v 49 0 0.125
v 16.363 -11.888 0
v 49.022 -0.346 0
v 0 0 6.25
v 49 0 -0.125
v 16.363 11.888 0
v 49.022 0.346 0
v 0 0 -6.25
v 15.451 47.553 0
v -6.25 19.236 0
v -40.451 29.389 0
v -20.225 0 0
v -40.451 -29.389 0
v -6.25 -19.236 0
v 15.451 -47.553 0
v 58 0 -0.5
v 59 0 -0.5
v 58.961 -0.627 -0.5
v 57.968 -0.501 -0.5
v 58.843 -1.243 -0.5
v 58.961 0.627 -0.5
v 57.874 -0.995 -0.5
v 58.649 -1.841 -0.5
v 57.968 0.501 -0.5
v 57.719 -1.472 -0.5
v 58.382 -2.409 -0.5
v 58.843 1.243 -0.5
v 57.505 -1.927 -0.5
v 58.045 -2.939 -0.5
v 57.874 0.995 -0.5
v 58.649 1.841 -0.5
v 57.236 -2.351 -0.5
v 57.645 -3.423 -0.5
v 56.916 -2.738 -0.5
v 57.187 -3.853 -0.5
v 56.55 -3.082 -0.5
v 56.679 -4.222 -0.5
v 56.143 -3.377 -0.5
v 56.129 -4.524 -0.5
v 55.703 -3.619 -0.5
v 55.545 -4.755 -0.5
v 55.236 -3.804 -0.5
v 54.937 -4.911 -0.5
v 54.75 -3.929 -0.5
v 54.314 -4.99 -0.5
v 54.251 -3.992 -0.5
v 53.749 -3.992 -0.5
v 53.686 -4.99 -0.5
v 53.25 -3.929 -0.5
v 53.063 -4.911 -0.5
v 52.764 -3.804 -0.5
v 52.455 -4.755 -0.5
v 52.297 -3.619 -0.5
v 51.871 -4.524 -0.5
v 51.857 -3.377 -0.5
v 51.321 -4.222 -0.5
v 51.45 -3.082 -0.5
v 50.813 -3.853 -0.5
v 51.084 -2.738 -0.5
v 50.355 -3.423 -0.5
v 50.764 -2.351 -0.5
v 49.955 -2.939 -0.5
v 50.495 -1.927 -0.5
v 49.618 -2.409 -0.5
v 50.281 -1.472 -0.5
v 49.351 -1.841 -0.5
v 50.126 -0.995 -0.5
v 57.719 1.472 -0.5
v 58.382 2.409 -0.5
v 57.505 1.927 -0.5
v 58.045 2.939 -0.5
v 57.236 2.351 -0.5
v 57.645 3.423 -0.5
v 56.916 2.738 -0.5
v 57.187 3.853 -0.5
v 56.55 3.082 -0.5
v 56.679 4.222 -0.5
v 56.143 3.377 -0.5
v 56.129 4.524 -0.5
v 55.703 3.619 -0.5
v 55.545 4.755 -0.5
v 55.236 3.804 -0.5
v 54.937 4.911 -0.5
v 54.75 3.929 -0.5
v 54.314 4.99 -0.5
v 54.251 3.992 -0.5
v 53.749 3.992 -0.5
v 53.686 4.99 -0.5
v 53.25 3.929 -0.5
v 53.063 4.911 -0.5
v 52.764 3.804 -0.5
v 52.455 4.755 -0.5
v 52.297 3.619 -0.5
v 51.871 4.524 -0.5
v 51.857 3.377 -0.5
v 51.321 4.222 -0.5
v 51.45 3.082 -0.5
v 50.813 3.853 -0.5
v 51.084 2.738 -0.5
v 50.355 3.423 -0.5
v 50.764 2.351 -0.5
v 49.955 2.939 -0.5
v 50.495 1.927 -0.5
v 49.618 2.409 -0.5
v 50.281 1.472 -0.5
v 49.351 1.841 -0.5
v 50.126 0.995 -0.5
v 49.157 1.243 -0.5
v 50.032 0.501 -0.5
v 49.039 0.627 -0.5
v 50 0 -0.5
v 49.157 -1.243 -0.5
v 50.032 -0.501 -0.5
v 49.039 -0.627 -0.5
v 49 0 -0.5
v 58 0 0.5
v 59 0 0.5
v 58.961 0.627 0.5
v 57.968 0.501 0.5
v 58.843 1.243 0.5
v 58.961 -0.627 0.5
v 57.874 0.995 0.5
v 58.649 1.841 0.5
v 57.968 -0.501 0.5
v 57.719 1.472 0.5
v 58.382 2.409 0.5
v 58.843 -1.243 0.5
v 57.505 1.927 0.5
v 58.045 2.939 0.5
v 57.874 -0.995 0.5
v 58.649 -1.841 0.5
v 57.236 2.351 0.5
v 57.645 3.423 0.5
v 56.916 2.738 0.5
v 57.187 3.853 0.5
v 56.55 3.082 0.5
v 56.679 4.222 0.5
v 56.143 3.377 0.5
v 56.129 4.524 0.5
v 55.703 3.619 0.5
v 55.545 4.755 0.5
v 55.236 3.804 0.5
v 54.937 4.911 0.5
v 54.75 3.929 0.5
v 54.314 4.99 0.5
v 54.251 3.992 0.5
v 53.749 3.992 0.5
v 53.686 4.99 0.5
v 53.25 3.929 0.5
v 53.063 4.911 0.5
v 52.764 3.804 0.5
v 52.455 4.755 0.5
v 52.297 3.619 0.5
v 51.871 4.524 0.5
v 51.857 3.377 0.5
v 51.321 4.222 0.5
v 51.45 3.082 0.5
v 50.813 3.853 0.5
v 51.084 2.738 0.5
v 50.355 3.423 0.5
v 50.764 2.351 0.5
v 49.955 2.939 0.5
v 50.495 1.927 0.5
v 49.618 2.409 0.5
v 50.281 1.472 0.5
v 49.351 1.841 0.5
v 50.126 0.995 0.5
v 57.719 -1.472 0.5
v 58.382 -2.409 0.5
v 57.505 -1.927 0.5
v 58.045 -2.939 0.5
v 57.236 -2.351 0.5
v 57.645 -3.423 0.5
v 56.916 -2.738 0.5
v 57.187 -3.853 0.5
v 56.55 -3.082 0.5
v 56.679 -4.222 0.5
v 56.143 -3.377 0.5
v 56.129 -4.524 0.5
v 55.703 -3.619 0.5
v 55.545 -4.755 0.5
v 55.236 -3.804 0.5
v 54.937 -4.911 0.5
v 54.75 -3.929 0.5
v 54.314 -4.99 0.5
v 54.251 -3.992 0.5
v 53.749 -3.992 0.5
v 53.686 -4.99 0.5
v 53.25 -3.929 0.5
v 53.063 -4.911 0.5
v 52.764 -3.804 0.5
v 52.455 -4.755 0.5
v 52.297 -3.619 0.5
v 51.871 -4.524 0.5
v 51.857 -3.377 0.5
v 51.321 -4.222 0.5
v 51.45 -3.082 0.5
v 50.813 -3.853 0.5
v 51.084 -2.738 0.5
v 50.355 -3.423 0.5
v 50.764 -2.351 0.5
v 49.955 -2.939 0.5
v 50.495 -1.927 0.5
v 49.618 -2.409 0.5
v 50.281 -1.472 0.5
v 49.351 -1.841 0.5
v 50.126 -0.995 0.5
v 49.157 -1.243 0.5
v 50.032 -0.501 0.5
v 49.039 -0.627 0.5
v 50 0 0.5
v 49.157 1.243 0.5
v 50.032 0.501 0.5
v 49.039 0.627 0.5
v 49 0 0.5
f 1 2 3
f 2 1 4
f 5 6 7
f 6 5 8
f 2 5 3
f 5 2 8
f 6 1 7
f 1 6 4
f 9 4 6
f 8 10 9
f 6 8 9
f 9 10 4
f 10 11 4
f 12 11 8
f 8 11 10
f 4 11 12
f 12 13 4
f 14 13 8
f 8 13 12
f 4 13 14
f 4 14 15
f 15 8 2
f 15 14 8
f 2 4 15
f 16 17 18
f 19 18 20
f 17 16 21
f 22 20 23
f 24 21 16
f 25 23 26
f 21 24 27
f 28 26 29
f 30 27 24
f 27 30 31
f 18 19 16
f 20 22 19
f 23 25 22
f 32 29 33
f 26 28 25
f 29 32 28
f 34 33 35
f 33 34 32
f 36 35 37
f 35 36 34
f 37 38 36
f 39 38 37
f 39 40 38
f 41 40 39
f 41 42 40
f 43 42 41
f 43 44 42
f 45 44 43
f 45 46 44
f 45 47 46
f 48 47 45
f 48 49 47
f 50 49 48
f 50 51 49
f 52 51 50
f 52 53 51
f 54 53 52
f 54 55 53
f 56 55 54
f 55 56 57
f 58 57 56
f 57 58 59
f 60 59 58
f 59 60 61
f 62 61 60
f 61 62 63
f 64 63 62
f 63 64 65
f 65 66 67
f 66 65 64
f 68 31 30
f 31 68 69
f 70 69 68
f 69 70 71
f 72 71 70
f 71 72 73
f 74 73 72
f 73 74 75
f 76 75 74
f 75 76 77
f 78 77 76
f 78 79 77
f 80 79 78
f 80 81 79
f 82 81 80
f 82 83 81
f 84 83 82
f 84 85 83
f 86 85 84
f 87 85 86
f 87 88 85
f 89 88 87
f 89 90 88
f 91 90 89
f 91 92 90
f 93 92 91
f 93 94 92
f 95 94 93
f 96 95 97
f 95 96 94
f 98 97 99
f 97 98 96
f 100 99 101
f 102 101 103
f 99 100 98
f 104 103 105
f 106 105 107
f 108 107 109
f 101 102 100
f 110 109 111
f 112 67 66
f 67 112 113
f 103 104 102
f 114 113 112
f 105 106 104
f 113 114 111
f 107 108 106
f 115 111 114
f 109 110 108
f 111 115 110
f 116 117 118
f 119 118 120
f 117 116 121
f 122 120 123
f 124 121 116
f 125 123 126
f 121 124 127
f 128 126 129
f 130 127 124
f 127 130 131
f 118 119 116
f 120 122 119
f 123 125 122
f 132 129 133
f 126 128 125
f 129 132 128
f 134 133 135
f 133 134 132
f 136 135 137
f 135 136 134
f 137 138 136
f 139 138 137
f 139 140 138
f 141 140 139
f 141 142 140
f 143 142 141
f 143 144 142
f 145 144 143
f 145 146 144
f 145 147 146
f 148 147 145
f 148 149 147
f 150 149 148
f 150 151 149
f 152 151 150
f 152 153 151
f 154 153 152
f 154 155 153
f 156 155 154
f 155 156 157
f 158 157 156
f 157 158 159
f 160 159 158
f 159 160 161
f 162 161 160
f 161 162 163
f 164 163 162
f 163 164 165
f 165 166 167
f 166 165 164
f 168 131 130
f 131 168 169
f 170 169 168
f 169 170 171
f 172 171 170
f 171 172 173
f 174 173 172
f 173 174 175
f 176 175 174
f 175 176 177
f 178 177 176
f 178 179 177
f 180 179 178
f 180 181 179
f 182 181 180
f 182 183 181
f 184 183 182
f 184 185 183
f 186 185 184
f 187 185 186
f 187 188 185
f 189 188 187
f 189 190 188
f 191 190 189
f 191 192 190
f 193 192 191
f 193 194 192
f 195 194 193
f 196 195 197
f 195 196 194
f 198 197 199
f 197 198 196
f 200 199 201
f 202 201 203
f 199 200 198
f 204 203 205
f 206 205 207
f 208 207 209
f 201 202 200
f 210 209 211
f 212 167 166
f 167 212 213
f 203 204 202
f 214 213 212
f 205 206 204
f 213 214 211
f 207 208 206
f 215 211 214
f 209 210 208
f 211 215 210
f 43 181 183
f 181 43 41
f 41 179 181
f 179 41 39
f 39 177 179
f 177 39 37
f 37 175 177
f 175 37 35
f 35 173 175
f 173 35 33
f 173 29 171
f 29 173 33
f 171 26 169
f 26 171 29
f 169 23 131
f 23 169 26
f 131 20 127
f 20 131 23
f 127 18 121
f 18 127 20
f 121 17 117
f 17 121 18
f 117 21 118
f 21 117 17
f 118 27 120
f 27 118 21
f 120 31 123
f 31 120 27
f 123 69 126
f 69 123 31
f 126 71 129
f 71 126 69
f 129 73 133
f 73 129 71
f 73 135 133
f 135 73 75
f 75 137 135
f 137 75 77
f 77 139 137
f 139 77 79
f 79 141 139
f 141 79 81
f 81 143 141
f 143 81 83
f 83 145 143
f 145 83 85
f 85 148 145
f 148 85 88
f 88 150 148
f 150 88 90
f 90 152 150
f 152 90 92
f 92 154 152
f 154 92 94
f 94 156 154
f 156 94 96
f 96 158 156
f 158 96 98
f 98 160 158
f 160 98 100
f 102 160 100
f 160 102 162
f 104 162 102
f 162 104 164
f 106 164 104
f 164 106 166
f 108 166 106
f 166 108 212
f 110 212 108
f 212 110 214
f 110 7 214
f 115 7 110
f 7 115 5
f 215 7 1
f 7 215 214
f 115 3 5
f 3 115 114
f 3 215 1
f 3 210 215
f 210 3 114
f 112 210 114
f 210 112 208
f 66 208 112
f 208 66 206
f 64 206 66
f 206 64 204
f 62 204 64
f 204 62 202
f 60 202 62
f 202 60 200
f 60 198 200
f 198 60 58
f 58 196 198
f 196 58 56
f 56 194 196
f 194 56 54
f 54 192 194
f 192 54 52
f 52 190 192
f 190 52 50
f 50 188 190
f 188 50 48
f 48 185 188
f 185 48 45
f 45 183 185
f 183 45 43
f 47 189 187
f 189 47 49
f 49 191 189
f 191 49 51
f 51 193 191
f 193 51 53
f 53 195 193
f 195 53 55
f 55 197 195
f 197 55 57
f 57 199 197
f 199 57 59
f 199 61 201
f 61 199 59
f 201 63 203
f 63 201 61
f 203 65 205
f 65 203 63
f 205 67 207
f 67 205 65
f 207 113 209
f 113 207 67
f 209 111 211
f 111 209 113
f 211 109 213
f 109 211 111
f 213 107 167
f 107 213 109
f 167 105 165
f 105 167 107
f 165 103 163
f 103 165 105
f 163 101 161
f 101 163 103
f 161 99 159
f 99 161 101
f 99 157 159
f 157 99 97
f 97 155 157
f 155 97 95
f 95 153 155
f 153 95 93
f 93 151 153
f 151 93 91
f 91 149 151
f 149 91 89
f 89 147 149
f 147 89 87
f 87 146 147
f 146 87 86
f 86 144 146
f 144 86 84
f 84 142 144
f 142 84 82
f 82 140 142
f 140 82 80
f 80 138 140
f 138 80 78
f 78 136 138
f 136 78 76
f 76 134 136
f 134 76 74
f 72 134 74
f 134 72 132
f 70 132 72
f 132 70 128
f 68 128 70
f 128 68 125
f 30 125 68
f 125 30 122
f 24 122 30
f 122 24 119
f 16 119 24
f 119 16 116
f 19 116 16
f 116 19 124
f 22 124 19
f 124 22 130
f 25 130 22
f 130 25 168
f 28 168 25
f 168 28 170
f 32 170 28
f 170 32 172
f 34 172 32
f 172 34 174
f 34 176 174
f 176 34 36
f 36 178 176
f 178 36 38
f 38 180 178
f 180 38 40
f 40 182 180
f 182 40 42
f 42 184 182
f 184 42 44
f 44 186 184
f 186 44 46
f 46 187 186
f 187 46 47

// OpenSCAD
// [FL_INDEX: keywords="openscad, 3d_parametric, Customizable_Christmas_Star, csg_solid" | COT="Parametric OpenSCAD design from 3DCodeverse"]
// Title: Customizable Christmas Star

number_of_points = 5; // [4:50]
// Diameter of the star in mm: 
size = 100; // [10:500]
// How much longer than the body should the points of the star be?
point_to_body_ratio = 2.0; // [1.0:5.0]

module ring(radius, rHeight)
{
	linear_extrude(height = rHeight, center = true)
	{
		difference()
		{
			circle(radius, $fn=50);
			circle(radius-rHeight, $fn=50); 
		}// preview[view:south, tilt:top]
	}
}

module star(bodyRadius, numberOfPoints, pointRadius, height)
{
	for (i = [0:numberOfPoints])
	{
		rotate(i*(360/numberOfPoints))
		{
			polyhedron ( points = [[0, 0, height/2], [0, 0, -height/2], [cos(360/numberOfPoints)*bodyRadius, sin(360/numberOfPoints)*bodyRadius, 0], [cos(360-360/numberOfPoints)*bodyRadius, sin(360-360/numberOfPoints)*bodyRadius, 0], [pointRadius, 0, 0]], triangles = [[3,0,4], [0,2,4], [2,1,4], [1,3,4], [0,3,1], [2,0,1],]);
		}
	}
}

module starWithRing(bodyRadius, numberOfPoints, pointRadius, height, ringRadius)
{
	union()
	{
		star(bodyRadius, numberOfPoints, pointRadius, height);
		translate([pointRadius + ringRadius - 1,0,0])
		{
			ring(ringRadius,1);
		}
	}
}
 
if (size < 30)
{
	star(size/(1.0 + point_to_body_ratio)/2, number_of_points, size/2, size/8);
}
else
{
	starWithRing(size/(1.0 + point_to_body_ratio)/2, number_of_points, size/2, size/8, 5);
}
